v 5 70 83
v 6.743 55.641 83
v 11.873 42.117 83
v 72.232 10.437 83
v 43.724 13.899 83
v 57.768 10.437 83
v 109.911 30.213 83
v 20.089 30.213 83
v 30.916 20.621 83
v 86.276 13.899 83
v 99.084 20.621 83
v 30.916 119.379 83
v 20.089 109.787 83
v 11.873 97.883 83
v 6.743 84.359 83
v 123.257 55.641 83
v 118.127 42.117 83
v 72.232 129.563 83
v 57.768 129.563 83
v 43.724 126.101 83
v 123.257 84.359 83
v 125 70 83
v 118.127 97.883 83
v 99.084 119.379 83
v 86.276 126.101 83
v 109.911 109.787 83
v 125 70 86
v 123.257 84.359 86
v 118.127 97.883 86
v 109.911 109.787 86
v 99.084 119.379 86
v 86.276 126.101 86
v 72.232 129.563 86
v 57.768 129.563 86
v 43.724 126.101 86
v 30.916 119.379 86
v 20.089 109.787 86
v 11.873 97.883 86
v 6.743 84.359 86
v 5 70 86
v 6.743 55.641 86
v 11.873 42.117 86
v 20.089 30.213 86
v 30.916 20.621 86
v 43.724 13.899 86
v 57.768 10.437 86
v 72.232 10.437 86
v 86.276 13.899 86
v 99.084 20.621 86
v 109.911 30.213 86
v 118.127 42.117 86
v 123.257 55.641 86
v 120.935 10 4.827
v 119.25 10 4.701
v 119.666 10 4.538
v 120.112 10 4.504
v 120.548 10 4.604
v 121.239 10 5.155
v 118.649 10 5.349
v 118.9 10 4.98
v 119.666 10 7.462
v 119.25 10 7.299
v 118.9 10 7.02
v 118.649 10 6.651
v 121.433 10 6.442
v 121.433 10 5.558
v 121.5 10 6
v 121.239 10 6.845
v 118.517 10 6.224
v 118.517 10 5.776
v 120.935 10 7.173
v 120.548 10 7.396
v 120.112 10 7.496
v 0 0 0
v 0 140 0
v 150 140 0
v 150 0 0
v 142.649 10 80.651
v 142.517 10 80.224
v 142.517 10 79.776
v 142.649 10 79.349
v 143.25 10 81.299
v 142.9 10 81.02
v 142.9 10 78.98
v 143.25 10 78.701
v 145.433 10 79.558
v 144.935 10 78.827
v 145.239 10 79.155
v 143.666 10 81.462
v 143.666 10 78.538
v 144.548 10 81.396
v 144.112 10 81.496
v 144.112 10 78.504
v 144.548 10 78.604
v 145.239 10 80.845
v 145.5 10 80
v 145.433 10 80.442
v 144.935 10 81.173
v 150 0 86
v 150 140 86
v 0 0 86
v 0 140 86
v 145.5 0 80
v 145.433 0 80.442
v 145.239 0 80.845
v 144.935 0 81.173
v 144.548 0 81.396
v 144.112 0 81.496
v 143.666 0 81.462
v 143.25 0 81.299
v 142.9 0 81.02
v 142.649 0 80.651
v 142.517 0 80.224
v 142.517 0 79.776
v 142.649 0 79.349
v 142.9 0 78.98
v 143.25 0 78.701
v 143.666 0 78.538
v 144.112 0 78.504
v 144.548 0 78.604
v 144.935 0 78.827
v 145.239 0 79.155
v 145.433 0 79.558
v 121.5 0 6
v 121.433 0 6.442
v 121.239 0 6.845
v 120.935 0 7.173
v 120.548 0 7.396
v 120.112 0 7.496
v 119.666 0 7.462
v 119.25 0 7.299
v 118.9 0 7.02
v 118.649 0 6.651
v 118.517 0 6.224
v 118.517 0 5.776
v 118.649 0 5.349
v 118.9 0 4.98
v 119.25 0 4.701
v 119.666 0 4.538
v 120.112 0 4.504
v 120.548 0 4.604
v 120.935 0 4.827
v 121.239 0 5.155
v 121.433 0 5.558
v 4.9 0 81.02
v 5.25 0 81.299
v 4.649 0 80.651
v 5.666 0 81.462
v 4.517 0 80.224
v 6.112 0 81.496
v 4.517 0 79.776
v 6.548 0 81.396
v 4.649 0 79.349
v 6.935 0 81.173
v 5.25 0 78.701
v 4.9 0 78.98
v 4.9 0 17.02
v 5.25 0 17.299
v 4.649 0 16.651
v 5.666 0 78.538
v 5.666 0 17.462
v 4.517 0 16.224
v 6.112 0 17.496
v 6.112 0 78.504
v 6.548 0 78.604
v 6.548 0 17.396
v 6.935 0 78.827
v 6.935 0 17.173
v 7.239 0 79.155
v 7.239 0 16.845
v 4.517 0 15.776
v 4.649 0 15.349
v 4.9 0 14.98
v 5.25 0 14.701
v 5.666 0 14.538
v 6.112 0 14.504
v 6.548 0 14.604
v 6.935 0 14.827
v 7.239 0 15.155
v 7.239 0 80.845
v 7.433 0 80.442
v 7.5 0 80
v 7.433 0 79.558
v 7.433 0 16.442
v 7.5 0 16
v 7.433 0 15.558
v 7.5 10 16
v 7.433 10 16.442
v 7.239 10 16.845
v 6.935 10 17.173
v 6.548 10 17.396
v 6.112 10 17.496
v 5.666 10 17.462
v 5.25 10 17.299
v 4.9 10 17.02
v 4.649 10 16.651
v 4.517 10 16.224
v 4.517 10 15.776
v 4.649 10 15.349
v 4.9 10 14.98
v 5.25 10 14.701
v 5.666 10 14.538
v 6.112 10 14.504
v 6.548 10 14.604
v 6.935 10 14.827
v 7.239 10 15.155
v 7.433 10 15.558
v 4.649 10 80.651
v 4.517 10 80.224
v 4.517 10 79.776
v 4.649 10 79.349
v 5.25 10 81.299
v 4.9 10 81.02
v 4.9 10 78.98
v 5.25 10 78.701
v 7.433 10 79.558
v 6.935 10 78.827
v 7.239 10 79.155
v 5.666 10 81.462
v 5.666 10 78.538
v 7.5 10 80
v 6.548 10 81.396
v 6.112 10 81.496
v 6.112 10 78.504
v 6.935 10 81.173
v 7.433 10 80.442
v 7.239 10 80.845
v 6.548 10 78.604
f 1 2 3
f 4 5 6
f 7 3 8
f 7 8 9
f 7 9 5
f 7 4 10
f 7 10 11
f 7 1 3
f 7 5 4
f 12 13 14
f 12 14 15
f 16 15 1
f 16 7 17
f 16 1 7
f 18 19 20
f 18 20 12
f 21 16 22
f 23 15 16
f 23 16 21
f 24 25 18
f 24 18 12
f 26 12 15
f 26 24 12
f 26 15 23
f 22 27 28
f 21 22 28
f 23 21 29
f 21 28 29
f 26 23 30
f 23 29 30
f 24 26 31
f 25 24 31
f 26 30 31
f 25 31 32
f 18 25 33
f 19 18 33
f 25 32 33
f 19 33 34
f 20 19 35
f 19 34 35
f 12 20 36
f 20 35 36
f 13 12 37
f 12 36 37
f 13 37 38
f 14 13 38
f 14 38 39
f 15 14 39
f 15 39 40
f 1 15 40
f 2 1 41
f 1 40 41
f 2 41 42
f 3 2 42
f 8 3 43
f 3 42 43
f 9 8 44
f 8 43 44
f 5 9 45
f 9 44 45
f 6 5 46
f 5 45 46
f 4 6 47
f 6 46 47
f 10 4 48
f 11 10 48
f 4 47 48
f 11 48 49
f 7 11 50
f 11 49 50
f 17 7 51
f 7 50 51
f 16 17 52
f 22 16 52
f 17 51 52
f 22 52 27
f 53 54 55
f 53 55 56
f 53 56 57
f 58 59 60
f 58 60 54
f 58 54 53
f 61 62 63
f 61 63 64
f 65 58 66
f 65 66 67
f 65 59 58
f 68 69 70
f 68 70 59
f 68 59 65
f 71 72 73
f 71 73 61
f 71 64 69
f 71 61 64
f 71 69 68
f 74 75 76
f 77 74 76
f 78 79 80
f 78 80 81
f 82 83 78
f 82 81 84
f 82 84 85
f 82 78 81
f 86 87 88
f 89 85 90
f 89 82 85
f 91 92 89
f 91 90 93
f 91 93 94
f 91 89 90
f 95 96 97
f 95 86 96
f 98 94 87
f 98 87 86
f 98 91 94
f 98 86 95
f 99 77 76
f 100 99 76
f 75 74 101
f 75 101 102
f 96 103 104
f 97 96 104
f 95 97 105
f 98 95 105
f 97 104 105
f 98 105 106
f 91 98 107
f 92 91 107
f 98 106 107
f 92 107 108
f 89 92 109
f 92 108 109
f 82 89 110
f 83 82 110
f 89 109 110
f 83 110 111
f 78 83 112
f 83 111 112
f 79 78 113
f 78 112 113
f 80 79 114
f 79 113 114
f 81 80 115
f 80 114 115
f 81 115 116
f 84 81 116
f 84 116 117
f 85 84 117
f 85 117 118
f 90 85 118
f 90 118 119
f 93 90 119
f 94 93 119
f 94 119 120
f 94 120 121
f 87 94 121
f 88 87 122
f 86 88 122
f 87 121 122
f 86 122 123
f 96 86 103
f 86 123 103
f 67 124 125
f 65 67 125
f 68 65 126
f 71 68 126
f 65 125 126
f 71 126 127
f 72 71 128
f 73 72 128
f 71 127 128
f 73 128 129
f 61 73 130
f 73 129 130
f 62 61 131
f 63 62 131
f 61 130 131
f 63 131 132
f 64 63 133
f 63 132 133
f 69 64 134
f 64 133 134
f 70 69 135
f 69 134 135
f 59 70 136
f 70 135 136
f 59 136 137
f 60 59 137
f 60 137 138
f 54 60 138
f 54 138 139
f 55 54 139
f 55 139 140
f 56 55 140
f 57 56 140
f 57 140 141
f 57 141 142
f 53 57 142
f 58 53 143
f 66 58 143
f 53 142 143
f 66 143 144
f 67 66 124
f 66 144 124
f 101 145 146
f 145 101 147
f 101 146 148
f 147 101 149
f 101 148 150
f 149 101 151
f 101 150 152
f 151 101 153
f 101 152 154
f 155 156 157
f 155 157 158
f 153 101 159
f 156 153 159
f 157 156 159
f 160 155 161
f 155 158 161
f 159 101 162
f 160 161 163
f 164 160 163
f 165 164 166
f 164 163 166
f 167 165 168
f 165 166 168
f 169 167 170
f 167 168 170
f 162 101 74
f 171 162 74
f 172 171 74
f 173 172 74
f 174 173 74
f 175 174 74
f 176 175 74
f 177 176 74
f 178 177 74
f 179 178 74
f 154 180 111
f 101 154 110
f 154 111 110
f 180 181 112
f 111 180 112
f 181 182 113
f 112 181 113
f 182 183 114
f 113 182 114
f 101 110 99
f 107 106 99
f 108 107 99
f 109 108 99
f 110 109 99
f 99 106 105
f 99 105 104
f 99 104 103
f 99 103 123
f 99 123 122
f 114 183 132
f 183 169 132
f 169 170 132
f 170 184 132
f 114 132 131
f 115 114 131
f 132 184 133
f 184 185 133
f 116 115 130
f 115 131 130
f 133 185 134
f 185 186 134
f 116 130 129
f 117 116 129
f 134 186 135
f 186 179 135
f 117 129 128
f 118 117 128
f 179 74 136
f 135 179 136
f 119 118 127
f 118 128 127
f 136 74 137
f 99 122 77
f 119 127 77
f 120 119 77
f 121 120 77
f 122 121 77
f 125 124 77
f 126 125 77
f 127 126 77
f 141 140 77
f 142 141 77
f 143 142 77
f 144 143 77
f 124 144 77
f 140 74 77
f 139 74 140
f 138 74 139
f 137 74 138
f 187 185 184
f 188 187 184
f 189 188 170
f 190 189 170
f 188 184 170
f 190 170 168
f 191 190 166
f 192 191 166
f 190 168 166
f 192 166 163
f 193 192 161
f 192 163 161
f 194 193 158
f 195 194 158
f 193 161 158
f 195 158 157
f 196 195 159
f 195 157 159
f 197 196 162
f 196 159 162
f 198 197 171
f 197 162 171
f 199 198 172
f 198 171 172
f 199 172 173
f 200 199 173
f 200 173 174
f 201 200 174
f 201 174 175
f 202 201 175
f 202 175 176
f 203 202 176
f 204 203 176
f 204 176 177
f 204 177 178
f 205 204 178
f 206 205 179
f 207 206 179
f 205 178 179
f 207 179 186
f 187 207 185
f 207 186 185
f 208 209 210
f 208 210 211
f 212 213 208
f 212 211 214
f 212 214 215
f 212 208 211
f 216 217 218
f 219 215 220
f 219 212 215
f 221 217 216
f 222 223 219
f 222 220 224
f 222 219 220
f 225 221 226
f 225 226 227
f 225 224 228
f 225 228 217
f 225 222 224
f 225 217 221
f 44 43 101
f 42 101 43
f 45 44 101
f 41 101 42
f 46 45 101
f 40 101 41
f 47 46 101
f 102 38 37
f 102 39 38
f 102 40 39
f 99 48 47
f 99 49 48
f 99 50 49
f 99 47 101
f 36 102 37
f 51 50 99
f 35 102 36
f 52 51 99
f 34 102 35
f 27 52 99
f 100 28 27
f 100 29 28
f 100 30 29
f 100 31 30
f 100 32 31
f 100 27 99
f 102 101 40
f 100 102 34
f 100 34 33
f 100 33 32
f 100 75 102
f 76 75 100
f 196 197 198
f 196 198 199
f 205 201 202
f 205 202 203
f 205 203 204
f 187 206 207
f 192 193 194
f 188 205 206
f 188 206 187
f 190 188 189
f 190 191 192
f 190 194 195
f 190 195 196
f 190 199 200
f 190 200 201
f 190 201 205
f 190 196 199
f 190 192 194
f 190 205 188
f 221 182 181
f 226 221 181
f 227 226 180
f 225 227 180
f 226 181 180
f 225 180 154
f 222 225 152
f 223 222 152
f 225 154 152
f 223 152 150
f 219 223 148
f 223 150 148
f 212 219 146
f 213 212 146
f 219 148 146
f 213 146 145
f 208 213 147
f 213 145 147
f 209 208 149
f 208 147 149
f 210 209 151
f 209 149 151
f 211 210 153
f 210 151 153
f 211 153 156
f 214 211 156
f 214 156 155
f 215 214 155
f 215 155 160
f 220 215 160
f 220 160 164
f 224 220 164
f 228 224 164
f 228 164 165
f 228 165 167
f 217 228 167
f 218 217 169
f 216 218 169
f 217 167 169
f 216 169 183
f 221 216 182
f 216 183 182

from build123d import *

# Parameters (mm, degrees)
F0_W     = 150
F0_H     = 140
F1_DEPTH = 86
F2_R     = 1.5
F3_DEPTH = 10
F4_R     = 60
F5_DEPTH = 3


with BuildPart() as f1:
    # F0 (on Top) → F1 (new body)
    with BuildSketch(Plane.XY):
        with Locations((75, 70)):
            Rectangle(F0_W, F0_H)
    extrude(amount=F1_DEPTH)

    # F2 (on face) → F3 (cut)
    with BuildSketch(Plane.XZ):
        with Locations((6, 80)):
            Circle(F2_R)
        with Locations((6, 16)):
            Circle(F2_R)
        with Locations((144, 80)):
            Circle(F2_R)
        with Locations((120, 6)):
            Circle(F2_R)
    extrude(amount=-F3_DEPTH, mode=Mode.SUBTRACT)

    # F4 (on face) → F5 (cut)
    with BuildSketch(Plane.XY.offset(86)):
        with Locations((65, 70)):
            Circle(F4_R)
    extrude(amount=-F5_DEPTH, mode=Mode.SUBTRACT)


solid = f1.part
